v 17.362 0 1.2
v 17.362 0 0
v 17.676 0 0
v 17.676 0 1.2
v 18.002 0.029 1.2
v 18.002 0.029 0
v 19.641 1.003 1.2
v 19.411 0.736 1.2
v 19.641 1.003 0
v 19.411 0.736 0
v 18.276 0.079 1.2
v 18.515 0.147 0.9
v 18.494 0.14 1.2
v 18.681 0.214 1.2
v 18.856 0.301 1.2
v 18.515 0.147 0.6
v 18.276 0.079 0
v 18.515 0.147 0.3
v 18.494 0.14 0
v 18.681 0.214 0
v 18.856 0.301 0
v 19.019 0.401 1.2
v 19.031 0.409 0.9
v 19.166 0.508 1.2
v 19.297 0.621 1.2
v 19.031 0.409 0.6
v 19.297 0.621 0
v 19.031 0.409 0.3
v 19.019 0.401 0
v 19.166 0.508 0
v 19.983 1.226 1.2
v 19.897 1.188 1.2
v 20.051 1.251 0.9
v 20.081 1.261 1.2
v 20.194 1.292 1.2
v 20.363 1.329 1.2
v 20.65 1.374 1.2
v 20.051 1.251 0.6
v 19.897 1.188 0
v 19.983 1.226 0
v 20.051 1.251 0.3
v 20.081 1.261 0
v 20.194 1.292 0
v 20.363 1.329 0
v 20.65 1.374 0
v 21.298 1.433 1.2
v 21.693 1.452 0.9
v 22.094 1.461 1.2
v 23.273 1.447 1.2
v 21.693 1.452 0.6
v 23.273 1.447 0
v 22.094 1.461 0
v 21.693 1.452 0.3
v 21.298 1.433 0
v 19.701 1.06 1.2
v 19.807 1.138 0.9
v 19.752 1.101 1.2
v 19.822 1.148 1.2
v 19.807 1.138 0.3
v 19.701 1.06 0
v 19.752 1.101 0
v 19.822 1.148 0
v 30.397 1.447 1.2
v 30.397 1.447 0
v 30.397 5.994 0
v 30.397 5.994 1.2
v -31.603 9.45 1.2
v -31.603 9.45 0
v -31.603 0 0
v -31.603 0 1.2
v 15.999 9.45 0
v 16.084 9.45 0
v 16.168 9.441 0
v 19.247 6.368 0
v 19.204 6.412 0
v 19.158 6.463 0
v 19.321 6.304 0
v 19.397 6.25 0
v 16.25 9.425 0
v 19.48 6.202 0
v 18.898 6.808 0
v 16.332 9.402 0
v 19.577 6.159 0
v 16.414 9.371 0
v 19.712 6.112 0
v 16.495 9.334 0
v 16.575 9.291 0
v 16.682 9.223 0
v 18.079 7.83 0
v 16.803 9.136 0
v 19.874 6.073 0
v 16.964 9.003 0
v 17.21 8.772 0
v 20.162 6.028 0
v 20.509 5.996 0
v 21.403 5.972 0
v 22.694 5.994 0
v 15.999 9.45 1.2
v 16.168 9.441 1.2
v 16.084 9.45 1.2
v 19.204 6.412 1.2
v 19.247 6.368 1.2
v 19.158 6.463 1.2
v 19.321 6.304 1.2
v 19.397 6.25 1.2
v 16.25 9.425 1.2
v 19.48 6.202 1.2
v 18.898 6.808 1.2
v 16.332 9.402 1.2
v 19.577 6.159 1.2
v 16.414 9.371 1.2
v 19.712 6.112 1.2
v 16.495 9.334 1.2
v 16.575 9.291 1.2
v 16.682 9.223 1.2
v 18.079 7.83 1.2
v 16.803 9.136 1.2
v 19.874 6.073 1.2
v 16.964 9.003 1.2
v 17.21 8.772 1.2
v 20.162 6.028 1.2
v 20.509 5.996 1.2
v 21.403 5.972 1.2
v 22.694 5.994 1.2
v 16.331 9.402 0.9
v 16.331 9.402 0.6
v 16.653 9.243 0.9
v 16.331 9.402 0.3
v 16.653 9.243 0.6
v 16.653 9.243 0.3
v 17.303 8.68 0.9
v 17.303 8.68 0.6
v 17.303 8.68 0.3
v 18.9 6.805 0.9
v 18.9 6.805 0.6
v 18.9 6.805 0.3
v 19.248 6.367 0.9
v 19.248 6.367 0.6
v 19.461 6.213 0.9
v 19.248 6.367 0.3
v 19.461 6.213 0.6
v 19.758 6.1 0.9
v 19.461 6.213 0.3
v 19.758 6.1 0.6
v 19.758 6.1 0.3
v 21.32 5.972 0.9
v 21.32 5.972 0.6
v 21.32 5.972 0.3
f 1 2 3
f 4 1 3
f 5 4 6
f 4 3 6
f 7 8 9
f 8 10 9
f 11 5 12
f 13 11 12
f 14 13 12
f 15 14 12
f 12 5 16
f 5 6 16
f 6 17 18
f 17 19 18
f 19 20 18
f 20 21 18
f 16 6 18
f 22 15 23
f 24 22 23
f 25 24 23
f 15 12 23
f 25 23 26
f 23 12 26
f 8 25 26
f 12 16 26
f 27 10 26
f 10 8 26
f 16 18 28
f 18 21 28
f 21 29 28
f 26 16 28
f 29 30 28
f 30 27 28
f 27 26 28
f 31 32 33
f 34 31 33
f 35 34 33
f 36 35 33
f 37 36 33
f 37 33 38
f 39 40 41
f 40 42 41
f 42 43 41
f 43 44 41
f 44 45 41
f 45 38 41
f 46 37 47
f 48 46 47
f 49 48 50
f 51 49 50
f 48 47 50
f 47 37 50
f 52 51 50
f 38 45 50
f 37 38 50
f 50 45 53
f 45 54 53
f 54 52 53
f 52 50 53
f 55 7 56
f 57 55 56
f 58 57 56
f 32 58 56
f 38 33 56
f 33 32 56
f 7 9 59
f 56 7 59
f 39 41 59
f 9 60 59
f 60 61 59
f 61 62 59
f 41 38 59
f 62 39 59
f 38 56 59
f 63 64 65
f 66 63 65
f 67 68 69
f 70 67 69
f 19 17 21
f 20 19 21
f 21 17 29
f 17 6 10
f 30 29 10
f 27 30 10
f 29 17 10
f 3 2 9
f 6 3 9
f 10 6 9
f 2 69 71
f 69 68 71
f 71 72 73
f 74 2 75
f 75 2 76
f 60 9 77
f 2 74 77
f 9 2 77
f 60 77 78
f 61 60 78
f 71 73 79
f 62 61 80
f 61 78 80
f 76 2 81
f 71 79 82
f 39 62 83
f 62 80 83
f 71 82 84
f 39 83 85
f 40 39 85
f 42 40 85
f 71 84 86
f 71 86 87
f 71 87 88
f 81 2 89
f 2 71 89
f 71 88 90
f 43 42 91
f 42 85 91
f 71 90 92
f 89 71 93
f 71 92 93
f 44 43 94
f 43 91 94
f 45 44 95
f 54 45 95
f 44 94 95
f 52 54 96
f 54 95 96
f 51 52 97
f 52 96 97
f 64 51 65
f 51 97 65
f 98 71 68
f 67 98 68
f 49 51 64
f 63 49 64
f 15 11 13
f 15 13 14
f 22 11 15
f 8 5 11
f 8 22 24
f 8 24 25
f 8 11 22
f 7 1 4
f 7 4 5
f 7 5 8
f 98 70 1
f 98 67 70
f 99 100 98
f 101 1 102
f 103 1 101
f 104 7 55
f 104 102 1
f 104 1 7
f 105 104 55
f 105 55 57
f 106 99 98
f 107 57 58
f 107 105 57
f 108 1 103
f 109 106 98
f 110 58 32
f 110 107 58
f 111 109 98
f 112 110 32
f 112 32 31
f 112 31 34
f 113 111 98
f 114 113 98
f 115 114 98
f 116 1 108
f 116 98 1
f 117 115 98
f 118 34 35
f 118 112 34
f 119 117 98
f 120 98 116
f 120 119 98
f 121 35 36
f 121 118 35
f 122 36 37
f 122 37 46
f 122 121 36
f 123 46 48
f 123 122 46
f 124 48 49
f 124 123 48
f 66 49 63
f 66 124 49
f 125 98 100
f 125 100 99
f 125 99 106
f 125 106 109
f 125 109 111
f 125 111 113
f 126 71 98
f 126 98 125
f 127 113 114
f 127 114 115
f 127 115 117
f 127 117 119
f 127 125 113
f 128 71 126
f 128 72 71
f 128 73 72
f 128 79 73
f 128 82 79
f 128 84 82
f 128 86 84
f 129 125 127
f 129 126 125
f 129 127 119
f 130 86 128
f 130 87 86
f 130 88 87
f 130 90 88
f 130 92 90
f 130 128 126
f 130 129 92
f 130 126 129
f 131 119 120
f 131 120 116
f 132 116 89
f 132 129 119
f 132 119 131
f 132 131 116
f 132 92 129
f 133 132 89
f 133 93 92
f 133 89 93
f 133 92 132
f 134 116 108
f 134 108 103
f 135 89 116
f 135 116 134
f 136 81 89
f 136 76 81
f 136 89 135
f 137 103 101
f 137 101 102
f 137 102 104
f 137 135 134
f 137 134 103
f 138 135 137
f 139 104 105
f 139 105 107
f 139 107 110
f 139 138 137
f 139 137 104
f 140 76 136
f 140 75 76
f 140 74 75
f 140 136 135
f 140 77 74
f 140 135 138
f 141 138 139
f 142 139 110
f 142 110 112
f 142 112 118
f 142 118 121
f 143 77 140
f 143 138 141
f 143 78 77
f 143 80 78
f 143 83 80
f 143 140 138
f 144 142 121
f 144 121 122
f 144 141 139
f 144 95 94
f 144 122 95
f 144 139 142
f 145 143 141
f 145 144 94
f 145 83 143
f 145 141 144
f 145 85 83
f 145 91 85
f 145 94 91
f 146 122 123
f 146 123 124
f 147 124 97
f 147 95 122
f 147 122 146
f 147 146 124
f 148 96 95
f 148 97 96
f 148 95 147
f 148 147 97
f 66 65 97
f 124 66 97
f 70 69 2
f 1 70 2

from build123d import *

# Parameters (mm, degrees)
F1_DEPTH = 1.2


with BuildPart() as f1:
    # F0 (on Top) → F1 (new body)
    with BuildSketch(Plane.XY):
        with BuildLine():
            Line((-31.6033400595, 0), (-18.3987915516, 0))
            Line((-18.3987915516, 0), (17.361568287, 0))
            add(Edge.make_bspline(
                [(17.361568287, 0), (17.6653276456, -0.0151373092), (18.5618703821, 0.0351687115), (19.4891966539, 0.7192725546), (19.8618906847, 1.5062680295), (22.6219379208, 1.4758684176), (23.2729754299, 1.4467175351)],
                knots=[0, 0, 0, 0, 0.223860151, 0.4395498979, 0.6269841693, 1, 1, 1, 1], degree=3))
            Line((23.2729754299, 1.4467175351), (30.3966599405, 1.4467175351))
            Line((30.3966599405, 1.4467175351), (30.3966599405, 5.9939725325))
            Line((30.3966599405, 5.9939725325), (22.6935977936, 5.9939725325))
            add(Edge.make_bspline(
                [(15.9988217056, 9.45), (16.4529830217, 9.4699785113), (17.3664699522, 8.7071065894), (18.9562119726, 6.8036674365), (19.5039672266, 5.8425249718), (22.1805847091, 5.9939725325), (22.6935977936, 5.9939725325)],
                knots=[0, 0, 0, 0, 0.2210198142, 0.5029222248, 0.6921587786, 1, 1, 1, 1], degree=3))
            Line((15.9988217056, 9.45), (-31.6033400595, 9.45))
            Line((-31.6033400595, 9.45), (-31.6033400595, 0))
        make_face()
    extrude(amount=F1_DEPTH)


solid = f1.part
